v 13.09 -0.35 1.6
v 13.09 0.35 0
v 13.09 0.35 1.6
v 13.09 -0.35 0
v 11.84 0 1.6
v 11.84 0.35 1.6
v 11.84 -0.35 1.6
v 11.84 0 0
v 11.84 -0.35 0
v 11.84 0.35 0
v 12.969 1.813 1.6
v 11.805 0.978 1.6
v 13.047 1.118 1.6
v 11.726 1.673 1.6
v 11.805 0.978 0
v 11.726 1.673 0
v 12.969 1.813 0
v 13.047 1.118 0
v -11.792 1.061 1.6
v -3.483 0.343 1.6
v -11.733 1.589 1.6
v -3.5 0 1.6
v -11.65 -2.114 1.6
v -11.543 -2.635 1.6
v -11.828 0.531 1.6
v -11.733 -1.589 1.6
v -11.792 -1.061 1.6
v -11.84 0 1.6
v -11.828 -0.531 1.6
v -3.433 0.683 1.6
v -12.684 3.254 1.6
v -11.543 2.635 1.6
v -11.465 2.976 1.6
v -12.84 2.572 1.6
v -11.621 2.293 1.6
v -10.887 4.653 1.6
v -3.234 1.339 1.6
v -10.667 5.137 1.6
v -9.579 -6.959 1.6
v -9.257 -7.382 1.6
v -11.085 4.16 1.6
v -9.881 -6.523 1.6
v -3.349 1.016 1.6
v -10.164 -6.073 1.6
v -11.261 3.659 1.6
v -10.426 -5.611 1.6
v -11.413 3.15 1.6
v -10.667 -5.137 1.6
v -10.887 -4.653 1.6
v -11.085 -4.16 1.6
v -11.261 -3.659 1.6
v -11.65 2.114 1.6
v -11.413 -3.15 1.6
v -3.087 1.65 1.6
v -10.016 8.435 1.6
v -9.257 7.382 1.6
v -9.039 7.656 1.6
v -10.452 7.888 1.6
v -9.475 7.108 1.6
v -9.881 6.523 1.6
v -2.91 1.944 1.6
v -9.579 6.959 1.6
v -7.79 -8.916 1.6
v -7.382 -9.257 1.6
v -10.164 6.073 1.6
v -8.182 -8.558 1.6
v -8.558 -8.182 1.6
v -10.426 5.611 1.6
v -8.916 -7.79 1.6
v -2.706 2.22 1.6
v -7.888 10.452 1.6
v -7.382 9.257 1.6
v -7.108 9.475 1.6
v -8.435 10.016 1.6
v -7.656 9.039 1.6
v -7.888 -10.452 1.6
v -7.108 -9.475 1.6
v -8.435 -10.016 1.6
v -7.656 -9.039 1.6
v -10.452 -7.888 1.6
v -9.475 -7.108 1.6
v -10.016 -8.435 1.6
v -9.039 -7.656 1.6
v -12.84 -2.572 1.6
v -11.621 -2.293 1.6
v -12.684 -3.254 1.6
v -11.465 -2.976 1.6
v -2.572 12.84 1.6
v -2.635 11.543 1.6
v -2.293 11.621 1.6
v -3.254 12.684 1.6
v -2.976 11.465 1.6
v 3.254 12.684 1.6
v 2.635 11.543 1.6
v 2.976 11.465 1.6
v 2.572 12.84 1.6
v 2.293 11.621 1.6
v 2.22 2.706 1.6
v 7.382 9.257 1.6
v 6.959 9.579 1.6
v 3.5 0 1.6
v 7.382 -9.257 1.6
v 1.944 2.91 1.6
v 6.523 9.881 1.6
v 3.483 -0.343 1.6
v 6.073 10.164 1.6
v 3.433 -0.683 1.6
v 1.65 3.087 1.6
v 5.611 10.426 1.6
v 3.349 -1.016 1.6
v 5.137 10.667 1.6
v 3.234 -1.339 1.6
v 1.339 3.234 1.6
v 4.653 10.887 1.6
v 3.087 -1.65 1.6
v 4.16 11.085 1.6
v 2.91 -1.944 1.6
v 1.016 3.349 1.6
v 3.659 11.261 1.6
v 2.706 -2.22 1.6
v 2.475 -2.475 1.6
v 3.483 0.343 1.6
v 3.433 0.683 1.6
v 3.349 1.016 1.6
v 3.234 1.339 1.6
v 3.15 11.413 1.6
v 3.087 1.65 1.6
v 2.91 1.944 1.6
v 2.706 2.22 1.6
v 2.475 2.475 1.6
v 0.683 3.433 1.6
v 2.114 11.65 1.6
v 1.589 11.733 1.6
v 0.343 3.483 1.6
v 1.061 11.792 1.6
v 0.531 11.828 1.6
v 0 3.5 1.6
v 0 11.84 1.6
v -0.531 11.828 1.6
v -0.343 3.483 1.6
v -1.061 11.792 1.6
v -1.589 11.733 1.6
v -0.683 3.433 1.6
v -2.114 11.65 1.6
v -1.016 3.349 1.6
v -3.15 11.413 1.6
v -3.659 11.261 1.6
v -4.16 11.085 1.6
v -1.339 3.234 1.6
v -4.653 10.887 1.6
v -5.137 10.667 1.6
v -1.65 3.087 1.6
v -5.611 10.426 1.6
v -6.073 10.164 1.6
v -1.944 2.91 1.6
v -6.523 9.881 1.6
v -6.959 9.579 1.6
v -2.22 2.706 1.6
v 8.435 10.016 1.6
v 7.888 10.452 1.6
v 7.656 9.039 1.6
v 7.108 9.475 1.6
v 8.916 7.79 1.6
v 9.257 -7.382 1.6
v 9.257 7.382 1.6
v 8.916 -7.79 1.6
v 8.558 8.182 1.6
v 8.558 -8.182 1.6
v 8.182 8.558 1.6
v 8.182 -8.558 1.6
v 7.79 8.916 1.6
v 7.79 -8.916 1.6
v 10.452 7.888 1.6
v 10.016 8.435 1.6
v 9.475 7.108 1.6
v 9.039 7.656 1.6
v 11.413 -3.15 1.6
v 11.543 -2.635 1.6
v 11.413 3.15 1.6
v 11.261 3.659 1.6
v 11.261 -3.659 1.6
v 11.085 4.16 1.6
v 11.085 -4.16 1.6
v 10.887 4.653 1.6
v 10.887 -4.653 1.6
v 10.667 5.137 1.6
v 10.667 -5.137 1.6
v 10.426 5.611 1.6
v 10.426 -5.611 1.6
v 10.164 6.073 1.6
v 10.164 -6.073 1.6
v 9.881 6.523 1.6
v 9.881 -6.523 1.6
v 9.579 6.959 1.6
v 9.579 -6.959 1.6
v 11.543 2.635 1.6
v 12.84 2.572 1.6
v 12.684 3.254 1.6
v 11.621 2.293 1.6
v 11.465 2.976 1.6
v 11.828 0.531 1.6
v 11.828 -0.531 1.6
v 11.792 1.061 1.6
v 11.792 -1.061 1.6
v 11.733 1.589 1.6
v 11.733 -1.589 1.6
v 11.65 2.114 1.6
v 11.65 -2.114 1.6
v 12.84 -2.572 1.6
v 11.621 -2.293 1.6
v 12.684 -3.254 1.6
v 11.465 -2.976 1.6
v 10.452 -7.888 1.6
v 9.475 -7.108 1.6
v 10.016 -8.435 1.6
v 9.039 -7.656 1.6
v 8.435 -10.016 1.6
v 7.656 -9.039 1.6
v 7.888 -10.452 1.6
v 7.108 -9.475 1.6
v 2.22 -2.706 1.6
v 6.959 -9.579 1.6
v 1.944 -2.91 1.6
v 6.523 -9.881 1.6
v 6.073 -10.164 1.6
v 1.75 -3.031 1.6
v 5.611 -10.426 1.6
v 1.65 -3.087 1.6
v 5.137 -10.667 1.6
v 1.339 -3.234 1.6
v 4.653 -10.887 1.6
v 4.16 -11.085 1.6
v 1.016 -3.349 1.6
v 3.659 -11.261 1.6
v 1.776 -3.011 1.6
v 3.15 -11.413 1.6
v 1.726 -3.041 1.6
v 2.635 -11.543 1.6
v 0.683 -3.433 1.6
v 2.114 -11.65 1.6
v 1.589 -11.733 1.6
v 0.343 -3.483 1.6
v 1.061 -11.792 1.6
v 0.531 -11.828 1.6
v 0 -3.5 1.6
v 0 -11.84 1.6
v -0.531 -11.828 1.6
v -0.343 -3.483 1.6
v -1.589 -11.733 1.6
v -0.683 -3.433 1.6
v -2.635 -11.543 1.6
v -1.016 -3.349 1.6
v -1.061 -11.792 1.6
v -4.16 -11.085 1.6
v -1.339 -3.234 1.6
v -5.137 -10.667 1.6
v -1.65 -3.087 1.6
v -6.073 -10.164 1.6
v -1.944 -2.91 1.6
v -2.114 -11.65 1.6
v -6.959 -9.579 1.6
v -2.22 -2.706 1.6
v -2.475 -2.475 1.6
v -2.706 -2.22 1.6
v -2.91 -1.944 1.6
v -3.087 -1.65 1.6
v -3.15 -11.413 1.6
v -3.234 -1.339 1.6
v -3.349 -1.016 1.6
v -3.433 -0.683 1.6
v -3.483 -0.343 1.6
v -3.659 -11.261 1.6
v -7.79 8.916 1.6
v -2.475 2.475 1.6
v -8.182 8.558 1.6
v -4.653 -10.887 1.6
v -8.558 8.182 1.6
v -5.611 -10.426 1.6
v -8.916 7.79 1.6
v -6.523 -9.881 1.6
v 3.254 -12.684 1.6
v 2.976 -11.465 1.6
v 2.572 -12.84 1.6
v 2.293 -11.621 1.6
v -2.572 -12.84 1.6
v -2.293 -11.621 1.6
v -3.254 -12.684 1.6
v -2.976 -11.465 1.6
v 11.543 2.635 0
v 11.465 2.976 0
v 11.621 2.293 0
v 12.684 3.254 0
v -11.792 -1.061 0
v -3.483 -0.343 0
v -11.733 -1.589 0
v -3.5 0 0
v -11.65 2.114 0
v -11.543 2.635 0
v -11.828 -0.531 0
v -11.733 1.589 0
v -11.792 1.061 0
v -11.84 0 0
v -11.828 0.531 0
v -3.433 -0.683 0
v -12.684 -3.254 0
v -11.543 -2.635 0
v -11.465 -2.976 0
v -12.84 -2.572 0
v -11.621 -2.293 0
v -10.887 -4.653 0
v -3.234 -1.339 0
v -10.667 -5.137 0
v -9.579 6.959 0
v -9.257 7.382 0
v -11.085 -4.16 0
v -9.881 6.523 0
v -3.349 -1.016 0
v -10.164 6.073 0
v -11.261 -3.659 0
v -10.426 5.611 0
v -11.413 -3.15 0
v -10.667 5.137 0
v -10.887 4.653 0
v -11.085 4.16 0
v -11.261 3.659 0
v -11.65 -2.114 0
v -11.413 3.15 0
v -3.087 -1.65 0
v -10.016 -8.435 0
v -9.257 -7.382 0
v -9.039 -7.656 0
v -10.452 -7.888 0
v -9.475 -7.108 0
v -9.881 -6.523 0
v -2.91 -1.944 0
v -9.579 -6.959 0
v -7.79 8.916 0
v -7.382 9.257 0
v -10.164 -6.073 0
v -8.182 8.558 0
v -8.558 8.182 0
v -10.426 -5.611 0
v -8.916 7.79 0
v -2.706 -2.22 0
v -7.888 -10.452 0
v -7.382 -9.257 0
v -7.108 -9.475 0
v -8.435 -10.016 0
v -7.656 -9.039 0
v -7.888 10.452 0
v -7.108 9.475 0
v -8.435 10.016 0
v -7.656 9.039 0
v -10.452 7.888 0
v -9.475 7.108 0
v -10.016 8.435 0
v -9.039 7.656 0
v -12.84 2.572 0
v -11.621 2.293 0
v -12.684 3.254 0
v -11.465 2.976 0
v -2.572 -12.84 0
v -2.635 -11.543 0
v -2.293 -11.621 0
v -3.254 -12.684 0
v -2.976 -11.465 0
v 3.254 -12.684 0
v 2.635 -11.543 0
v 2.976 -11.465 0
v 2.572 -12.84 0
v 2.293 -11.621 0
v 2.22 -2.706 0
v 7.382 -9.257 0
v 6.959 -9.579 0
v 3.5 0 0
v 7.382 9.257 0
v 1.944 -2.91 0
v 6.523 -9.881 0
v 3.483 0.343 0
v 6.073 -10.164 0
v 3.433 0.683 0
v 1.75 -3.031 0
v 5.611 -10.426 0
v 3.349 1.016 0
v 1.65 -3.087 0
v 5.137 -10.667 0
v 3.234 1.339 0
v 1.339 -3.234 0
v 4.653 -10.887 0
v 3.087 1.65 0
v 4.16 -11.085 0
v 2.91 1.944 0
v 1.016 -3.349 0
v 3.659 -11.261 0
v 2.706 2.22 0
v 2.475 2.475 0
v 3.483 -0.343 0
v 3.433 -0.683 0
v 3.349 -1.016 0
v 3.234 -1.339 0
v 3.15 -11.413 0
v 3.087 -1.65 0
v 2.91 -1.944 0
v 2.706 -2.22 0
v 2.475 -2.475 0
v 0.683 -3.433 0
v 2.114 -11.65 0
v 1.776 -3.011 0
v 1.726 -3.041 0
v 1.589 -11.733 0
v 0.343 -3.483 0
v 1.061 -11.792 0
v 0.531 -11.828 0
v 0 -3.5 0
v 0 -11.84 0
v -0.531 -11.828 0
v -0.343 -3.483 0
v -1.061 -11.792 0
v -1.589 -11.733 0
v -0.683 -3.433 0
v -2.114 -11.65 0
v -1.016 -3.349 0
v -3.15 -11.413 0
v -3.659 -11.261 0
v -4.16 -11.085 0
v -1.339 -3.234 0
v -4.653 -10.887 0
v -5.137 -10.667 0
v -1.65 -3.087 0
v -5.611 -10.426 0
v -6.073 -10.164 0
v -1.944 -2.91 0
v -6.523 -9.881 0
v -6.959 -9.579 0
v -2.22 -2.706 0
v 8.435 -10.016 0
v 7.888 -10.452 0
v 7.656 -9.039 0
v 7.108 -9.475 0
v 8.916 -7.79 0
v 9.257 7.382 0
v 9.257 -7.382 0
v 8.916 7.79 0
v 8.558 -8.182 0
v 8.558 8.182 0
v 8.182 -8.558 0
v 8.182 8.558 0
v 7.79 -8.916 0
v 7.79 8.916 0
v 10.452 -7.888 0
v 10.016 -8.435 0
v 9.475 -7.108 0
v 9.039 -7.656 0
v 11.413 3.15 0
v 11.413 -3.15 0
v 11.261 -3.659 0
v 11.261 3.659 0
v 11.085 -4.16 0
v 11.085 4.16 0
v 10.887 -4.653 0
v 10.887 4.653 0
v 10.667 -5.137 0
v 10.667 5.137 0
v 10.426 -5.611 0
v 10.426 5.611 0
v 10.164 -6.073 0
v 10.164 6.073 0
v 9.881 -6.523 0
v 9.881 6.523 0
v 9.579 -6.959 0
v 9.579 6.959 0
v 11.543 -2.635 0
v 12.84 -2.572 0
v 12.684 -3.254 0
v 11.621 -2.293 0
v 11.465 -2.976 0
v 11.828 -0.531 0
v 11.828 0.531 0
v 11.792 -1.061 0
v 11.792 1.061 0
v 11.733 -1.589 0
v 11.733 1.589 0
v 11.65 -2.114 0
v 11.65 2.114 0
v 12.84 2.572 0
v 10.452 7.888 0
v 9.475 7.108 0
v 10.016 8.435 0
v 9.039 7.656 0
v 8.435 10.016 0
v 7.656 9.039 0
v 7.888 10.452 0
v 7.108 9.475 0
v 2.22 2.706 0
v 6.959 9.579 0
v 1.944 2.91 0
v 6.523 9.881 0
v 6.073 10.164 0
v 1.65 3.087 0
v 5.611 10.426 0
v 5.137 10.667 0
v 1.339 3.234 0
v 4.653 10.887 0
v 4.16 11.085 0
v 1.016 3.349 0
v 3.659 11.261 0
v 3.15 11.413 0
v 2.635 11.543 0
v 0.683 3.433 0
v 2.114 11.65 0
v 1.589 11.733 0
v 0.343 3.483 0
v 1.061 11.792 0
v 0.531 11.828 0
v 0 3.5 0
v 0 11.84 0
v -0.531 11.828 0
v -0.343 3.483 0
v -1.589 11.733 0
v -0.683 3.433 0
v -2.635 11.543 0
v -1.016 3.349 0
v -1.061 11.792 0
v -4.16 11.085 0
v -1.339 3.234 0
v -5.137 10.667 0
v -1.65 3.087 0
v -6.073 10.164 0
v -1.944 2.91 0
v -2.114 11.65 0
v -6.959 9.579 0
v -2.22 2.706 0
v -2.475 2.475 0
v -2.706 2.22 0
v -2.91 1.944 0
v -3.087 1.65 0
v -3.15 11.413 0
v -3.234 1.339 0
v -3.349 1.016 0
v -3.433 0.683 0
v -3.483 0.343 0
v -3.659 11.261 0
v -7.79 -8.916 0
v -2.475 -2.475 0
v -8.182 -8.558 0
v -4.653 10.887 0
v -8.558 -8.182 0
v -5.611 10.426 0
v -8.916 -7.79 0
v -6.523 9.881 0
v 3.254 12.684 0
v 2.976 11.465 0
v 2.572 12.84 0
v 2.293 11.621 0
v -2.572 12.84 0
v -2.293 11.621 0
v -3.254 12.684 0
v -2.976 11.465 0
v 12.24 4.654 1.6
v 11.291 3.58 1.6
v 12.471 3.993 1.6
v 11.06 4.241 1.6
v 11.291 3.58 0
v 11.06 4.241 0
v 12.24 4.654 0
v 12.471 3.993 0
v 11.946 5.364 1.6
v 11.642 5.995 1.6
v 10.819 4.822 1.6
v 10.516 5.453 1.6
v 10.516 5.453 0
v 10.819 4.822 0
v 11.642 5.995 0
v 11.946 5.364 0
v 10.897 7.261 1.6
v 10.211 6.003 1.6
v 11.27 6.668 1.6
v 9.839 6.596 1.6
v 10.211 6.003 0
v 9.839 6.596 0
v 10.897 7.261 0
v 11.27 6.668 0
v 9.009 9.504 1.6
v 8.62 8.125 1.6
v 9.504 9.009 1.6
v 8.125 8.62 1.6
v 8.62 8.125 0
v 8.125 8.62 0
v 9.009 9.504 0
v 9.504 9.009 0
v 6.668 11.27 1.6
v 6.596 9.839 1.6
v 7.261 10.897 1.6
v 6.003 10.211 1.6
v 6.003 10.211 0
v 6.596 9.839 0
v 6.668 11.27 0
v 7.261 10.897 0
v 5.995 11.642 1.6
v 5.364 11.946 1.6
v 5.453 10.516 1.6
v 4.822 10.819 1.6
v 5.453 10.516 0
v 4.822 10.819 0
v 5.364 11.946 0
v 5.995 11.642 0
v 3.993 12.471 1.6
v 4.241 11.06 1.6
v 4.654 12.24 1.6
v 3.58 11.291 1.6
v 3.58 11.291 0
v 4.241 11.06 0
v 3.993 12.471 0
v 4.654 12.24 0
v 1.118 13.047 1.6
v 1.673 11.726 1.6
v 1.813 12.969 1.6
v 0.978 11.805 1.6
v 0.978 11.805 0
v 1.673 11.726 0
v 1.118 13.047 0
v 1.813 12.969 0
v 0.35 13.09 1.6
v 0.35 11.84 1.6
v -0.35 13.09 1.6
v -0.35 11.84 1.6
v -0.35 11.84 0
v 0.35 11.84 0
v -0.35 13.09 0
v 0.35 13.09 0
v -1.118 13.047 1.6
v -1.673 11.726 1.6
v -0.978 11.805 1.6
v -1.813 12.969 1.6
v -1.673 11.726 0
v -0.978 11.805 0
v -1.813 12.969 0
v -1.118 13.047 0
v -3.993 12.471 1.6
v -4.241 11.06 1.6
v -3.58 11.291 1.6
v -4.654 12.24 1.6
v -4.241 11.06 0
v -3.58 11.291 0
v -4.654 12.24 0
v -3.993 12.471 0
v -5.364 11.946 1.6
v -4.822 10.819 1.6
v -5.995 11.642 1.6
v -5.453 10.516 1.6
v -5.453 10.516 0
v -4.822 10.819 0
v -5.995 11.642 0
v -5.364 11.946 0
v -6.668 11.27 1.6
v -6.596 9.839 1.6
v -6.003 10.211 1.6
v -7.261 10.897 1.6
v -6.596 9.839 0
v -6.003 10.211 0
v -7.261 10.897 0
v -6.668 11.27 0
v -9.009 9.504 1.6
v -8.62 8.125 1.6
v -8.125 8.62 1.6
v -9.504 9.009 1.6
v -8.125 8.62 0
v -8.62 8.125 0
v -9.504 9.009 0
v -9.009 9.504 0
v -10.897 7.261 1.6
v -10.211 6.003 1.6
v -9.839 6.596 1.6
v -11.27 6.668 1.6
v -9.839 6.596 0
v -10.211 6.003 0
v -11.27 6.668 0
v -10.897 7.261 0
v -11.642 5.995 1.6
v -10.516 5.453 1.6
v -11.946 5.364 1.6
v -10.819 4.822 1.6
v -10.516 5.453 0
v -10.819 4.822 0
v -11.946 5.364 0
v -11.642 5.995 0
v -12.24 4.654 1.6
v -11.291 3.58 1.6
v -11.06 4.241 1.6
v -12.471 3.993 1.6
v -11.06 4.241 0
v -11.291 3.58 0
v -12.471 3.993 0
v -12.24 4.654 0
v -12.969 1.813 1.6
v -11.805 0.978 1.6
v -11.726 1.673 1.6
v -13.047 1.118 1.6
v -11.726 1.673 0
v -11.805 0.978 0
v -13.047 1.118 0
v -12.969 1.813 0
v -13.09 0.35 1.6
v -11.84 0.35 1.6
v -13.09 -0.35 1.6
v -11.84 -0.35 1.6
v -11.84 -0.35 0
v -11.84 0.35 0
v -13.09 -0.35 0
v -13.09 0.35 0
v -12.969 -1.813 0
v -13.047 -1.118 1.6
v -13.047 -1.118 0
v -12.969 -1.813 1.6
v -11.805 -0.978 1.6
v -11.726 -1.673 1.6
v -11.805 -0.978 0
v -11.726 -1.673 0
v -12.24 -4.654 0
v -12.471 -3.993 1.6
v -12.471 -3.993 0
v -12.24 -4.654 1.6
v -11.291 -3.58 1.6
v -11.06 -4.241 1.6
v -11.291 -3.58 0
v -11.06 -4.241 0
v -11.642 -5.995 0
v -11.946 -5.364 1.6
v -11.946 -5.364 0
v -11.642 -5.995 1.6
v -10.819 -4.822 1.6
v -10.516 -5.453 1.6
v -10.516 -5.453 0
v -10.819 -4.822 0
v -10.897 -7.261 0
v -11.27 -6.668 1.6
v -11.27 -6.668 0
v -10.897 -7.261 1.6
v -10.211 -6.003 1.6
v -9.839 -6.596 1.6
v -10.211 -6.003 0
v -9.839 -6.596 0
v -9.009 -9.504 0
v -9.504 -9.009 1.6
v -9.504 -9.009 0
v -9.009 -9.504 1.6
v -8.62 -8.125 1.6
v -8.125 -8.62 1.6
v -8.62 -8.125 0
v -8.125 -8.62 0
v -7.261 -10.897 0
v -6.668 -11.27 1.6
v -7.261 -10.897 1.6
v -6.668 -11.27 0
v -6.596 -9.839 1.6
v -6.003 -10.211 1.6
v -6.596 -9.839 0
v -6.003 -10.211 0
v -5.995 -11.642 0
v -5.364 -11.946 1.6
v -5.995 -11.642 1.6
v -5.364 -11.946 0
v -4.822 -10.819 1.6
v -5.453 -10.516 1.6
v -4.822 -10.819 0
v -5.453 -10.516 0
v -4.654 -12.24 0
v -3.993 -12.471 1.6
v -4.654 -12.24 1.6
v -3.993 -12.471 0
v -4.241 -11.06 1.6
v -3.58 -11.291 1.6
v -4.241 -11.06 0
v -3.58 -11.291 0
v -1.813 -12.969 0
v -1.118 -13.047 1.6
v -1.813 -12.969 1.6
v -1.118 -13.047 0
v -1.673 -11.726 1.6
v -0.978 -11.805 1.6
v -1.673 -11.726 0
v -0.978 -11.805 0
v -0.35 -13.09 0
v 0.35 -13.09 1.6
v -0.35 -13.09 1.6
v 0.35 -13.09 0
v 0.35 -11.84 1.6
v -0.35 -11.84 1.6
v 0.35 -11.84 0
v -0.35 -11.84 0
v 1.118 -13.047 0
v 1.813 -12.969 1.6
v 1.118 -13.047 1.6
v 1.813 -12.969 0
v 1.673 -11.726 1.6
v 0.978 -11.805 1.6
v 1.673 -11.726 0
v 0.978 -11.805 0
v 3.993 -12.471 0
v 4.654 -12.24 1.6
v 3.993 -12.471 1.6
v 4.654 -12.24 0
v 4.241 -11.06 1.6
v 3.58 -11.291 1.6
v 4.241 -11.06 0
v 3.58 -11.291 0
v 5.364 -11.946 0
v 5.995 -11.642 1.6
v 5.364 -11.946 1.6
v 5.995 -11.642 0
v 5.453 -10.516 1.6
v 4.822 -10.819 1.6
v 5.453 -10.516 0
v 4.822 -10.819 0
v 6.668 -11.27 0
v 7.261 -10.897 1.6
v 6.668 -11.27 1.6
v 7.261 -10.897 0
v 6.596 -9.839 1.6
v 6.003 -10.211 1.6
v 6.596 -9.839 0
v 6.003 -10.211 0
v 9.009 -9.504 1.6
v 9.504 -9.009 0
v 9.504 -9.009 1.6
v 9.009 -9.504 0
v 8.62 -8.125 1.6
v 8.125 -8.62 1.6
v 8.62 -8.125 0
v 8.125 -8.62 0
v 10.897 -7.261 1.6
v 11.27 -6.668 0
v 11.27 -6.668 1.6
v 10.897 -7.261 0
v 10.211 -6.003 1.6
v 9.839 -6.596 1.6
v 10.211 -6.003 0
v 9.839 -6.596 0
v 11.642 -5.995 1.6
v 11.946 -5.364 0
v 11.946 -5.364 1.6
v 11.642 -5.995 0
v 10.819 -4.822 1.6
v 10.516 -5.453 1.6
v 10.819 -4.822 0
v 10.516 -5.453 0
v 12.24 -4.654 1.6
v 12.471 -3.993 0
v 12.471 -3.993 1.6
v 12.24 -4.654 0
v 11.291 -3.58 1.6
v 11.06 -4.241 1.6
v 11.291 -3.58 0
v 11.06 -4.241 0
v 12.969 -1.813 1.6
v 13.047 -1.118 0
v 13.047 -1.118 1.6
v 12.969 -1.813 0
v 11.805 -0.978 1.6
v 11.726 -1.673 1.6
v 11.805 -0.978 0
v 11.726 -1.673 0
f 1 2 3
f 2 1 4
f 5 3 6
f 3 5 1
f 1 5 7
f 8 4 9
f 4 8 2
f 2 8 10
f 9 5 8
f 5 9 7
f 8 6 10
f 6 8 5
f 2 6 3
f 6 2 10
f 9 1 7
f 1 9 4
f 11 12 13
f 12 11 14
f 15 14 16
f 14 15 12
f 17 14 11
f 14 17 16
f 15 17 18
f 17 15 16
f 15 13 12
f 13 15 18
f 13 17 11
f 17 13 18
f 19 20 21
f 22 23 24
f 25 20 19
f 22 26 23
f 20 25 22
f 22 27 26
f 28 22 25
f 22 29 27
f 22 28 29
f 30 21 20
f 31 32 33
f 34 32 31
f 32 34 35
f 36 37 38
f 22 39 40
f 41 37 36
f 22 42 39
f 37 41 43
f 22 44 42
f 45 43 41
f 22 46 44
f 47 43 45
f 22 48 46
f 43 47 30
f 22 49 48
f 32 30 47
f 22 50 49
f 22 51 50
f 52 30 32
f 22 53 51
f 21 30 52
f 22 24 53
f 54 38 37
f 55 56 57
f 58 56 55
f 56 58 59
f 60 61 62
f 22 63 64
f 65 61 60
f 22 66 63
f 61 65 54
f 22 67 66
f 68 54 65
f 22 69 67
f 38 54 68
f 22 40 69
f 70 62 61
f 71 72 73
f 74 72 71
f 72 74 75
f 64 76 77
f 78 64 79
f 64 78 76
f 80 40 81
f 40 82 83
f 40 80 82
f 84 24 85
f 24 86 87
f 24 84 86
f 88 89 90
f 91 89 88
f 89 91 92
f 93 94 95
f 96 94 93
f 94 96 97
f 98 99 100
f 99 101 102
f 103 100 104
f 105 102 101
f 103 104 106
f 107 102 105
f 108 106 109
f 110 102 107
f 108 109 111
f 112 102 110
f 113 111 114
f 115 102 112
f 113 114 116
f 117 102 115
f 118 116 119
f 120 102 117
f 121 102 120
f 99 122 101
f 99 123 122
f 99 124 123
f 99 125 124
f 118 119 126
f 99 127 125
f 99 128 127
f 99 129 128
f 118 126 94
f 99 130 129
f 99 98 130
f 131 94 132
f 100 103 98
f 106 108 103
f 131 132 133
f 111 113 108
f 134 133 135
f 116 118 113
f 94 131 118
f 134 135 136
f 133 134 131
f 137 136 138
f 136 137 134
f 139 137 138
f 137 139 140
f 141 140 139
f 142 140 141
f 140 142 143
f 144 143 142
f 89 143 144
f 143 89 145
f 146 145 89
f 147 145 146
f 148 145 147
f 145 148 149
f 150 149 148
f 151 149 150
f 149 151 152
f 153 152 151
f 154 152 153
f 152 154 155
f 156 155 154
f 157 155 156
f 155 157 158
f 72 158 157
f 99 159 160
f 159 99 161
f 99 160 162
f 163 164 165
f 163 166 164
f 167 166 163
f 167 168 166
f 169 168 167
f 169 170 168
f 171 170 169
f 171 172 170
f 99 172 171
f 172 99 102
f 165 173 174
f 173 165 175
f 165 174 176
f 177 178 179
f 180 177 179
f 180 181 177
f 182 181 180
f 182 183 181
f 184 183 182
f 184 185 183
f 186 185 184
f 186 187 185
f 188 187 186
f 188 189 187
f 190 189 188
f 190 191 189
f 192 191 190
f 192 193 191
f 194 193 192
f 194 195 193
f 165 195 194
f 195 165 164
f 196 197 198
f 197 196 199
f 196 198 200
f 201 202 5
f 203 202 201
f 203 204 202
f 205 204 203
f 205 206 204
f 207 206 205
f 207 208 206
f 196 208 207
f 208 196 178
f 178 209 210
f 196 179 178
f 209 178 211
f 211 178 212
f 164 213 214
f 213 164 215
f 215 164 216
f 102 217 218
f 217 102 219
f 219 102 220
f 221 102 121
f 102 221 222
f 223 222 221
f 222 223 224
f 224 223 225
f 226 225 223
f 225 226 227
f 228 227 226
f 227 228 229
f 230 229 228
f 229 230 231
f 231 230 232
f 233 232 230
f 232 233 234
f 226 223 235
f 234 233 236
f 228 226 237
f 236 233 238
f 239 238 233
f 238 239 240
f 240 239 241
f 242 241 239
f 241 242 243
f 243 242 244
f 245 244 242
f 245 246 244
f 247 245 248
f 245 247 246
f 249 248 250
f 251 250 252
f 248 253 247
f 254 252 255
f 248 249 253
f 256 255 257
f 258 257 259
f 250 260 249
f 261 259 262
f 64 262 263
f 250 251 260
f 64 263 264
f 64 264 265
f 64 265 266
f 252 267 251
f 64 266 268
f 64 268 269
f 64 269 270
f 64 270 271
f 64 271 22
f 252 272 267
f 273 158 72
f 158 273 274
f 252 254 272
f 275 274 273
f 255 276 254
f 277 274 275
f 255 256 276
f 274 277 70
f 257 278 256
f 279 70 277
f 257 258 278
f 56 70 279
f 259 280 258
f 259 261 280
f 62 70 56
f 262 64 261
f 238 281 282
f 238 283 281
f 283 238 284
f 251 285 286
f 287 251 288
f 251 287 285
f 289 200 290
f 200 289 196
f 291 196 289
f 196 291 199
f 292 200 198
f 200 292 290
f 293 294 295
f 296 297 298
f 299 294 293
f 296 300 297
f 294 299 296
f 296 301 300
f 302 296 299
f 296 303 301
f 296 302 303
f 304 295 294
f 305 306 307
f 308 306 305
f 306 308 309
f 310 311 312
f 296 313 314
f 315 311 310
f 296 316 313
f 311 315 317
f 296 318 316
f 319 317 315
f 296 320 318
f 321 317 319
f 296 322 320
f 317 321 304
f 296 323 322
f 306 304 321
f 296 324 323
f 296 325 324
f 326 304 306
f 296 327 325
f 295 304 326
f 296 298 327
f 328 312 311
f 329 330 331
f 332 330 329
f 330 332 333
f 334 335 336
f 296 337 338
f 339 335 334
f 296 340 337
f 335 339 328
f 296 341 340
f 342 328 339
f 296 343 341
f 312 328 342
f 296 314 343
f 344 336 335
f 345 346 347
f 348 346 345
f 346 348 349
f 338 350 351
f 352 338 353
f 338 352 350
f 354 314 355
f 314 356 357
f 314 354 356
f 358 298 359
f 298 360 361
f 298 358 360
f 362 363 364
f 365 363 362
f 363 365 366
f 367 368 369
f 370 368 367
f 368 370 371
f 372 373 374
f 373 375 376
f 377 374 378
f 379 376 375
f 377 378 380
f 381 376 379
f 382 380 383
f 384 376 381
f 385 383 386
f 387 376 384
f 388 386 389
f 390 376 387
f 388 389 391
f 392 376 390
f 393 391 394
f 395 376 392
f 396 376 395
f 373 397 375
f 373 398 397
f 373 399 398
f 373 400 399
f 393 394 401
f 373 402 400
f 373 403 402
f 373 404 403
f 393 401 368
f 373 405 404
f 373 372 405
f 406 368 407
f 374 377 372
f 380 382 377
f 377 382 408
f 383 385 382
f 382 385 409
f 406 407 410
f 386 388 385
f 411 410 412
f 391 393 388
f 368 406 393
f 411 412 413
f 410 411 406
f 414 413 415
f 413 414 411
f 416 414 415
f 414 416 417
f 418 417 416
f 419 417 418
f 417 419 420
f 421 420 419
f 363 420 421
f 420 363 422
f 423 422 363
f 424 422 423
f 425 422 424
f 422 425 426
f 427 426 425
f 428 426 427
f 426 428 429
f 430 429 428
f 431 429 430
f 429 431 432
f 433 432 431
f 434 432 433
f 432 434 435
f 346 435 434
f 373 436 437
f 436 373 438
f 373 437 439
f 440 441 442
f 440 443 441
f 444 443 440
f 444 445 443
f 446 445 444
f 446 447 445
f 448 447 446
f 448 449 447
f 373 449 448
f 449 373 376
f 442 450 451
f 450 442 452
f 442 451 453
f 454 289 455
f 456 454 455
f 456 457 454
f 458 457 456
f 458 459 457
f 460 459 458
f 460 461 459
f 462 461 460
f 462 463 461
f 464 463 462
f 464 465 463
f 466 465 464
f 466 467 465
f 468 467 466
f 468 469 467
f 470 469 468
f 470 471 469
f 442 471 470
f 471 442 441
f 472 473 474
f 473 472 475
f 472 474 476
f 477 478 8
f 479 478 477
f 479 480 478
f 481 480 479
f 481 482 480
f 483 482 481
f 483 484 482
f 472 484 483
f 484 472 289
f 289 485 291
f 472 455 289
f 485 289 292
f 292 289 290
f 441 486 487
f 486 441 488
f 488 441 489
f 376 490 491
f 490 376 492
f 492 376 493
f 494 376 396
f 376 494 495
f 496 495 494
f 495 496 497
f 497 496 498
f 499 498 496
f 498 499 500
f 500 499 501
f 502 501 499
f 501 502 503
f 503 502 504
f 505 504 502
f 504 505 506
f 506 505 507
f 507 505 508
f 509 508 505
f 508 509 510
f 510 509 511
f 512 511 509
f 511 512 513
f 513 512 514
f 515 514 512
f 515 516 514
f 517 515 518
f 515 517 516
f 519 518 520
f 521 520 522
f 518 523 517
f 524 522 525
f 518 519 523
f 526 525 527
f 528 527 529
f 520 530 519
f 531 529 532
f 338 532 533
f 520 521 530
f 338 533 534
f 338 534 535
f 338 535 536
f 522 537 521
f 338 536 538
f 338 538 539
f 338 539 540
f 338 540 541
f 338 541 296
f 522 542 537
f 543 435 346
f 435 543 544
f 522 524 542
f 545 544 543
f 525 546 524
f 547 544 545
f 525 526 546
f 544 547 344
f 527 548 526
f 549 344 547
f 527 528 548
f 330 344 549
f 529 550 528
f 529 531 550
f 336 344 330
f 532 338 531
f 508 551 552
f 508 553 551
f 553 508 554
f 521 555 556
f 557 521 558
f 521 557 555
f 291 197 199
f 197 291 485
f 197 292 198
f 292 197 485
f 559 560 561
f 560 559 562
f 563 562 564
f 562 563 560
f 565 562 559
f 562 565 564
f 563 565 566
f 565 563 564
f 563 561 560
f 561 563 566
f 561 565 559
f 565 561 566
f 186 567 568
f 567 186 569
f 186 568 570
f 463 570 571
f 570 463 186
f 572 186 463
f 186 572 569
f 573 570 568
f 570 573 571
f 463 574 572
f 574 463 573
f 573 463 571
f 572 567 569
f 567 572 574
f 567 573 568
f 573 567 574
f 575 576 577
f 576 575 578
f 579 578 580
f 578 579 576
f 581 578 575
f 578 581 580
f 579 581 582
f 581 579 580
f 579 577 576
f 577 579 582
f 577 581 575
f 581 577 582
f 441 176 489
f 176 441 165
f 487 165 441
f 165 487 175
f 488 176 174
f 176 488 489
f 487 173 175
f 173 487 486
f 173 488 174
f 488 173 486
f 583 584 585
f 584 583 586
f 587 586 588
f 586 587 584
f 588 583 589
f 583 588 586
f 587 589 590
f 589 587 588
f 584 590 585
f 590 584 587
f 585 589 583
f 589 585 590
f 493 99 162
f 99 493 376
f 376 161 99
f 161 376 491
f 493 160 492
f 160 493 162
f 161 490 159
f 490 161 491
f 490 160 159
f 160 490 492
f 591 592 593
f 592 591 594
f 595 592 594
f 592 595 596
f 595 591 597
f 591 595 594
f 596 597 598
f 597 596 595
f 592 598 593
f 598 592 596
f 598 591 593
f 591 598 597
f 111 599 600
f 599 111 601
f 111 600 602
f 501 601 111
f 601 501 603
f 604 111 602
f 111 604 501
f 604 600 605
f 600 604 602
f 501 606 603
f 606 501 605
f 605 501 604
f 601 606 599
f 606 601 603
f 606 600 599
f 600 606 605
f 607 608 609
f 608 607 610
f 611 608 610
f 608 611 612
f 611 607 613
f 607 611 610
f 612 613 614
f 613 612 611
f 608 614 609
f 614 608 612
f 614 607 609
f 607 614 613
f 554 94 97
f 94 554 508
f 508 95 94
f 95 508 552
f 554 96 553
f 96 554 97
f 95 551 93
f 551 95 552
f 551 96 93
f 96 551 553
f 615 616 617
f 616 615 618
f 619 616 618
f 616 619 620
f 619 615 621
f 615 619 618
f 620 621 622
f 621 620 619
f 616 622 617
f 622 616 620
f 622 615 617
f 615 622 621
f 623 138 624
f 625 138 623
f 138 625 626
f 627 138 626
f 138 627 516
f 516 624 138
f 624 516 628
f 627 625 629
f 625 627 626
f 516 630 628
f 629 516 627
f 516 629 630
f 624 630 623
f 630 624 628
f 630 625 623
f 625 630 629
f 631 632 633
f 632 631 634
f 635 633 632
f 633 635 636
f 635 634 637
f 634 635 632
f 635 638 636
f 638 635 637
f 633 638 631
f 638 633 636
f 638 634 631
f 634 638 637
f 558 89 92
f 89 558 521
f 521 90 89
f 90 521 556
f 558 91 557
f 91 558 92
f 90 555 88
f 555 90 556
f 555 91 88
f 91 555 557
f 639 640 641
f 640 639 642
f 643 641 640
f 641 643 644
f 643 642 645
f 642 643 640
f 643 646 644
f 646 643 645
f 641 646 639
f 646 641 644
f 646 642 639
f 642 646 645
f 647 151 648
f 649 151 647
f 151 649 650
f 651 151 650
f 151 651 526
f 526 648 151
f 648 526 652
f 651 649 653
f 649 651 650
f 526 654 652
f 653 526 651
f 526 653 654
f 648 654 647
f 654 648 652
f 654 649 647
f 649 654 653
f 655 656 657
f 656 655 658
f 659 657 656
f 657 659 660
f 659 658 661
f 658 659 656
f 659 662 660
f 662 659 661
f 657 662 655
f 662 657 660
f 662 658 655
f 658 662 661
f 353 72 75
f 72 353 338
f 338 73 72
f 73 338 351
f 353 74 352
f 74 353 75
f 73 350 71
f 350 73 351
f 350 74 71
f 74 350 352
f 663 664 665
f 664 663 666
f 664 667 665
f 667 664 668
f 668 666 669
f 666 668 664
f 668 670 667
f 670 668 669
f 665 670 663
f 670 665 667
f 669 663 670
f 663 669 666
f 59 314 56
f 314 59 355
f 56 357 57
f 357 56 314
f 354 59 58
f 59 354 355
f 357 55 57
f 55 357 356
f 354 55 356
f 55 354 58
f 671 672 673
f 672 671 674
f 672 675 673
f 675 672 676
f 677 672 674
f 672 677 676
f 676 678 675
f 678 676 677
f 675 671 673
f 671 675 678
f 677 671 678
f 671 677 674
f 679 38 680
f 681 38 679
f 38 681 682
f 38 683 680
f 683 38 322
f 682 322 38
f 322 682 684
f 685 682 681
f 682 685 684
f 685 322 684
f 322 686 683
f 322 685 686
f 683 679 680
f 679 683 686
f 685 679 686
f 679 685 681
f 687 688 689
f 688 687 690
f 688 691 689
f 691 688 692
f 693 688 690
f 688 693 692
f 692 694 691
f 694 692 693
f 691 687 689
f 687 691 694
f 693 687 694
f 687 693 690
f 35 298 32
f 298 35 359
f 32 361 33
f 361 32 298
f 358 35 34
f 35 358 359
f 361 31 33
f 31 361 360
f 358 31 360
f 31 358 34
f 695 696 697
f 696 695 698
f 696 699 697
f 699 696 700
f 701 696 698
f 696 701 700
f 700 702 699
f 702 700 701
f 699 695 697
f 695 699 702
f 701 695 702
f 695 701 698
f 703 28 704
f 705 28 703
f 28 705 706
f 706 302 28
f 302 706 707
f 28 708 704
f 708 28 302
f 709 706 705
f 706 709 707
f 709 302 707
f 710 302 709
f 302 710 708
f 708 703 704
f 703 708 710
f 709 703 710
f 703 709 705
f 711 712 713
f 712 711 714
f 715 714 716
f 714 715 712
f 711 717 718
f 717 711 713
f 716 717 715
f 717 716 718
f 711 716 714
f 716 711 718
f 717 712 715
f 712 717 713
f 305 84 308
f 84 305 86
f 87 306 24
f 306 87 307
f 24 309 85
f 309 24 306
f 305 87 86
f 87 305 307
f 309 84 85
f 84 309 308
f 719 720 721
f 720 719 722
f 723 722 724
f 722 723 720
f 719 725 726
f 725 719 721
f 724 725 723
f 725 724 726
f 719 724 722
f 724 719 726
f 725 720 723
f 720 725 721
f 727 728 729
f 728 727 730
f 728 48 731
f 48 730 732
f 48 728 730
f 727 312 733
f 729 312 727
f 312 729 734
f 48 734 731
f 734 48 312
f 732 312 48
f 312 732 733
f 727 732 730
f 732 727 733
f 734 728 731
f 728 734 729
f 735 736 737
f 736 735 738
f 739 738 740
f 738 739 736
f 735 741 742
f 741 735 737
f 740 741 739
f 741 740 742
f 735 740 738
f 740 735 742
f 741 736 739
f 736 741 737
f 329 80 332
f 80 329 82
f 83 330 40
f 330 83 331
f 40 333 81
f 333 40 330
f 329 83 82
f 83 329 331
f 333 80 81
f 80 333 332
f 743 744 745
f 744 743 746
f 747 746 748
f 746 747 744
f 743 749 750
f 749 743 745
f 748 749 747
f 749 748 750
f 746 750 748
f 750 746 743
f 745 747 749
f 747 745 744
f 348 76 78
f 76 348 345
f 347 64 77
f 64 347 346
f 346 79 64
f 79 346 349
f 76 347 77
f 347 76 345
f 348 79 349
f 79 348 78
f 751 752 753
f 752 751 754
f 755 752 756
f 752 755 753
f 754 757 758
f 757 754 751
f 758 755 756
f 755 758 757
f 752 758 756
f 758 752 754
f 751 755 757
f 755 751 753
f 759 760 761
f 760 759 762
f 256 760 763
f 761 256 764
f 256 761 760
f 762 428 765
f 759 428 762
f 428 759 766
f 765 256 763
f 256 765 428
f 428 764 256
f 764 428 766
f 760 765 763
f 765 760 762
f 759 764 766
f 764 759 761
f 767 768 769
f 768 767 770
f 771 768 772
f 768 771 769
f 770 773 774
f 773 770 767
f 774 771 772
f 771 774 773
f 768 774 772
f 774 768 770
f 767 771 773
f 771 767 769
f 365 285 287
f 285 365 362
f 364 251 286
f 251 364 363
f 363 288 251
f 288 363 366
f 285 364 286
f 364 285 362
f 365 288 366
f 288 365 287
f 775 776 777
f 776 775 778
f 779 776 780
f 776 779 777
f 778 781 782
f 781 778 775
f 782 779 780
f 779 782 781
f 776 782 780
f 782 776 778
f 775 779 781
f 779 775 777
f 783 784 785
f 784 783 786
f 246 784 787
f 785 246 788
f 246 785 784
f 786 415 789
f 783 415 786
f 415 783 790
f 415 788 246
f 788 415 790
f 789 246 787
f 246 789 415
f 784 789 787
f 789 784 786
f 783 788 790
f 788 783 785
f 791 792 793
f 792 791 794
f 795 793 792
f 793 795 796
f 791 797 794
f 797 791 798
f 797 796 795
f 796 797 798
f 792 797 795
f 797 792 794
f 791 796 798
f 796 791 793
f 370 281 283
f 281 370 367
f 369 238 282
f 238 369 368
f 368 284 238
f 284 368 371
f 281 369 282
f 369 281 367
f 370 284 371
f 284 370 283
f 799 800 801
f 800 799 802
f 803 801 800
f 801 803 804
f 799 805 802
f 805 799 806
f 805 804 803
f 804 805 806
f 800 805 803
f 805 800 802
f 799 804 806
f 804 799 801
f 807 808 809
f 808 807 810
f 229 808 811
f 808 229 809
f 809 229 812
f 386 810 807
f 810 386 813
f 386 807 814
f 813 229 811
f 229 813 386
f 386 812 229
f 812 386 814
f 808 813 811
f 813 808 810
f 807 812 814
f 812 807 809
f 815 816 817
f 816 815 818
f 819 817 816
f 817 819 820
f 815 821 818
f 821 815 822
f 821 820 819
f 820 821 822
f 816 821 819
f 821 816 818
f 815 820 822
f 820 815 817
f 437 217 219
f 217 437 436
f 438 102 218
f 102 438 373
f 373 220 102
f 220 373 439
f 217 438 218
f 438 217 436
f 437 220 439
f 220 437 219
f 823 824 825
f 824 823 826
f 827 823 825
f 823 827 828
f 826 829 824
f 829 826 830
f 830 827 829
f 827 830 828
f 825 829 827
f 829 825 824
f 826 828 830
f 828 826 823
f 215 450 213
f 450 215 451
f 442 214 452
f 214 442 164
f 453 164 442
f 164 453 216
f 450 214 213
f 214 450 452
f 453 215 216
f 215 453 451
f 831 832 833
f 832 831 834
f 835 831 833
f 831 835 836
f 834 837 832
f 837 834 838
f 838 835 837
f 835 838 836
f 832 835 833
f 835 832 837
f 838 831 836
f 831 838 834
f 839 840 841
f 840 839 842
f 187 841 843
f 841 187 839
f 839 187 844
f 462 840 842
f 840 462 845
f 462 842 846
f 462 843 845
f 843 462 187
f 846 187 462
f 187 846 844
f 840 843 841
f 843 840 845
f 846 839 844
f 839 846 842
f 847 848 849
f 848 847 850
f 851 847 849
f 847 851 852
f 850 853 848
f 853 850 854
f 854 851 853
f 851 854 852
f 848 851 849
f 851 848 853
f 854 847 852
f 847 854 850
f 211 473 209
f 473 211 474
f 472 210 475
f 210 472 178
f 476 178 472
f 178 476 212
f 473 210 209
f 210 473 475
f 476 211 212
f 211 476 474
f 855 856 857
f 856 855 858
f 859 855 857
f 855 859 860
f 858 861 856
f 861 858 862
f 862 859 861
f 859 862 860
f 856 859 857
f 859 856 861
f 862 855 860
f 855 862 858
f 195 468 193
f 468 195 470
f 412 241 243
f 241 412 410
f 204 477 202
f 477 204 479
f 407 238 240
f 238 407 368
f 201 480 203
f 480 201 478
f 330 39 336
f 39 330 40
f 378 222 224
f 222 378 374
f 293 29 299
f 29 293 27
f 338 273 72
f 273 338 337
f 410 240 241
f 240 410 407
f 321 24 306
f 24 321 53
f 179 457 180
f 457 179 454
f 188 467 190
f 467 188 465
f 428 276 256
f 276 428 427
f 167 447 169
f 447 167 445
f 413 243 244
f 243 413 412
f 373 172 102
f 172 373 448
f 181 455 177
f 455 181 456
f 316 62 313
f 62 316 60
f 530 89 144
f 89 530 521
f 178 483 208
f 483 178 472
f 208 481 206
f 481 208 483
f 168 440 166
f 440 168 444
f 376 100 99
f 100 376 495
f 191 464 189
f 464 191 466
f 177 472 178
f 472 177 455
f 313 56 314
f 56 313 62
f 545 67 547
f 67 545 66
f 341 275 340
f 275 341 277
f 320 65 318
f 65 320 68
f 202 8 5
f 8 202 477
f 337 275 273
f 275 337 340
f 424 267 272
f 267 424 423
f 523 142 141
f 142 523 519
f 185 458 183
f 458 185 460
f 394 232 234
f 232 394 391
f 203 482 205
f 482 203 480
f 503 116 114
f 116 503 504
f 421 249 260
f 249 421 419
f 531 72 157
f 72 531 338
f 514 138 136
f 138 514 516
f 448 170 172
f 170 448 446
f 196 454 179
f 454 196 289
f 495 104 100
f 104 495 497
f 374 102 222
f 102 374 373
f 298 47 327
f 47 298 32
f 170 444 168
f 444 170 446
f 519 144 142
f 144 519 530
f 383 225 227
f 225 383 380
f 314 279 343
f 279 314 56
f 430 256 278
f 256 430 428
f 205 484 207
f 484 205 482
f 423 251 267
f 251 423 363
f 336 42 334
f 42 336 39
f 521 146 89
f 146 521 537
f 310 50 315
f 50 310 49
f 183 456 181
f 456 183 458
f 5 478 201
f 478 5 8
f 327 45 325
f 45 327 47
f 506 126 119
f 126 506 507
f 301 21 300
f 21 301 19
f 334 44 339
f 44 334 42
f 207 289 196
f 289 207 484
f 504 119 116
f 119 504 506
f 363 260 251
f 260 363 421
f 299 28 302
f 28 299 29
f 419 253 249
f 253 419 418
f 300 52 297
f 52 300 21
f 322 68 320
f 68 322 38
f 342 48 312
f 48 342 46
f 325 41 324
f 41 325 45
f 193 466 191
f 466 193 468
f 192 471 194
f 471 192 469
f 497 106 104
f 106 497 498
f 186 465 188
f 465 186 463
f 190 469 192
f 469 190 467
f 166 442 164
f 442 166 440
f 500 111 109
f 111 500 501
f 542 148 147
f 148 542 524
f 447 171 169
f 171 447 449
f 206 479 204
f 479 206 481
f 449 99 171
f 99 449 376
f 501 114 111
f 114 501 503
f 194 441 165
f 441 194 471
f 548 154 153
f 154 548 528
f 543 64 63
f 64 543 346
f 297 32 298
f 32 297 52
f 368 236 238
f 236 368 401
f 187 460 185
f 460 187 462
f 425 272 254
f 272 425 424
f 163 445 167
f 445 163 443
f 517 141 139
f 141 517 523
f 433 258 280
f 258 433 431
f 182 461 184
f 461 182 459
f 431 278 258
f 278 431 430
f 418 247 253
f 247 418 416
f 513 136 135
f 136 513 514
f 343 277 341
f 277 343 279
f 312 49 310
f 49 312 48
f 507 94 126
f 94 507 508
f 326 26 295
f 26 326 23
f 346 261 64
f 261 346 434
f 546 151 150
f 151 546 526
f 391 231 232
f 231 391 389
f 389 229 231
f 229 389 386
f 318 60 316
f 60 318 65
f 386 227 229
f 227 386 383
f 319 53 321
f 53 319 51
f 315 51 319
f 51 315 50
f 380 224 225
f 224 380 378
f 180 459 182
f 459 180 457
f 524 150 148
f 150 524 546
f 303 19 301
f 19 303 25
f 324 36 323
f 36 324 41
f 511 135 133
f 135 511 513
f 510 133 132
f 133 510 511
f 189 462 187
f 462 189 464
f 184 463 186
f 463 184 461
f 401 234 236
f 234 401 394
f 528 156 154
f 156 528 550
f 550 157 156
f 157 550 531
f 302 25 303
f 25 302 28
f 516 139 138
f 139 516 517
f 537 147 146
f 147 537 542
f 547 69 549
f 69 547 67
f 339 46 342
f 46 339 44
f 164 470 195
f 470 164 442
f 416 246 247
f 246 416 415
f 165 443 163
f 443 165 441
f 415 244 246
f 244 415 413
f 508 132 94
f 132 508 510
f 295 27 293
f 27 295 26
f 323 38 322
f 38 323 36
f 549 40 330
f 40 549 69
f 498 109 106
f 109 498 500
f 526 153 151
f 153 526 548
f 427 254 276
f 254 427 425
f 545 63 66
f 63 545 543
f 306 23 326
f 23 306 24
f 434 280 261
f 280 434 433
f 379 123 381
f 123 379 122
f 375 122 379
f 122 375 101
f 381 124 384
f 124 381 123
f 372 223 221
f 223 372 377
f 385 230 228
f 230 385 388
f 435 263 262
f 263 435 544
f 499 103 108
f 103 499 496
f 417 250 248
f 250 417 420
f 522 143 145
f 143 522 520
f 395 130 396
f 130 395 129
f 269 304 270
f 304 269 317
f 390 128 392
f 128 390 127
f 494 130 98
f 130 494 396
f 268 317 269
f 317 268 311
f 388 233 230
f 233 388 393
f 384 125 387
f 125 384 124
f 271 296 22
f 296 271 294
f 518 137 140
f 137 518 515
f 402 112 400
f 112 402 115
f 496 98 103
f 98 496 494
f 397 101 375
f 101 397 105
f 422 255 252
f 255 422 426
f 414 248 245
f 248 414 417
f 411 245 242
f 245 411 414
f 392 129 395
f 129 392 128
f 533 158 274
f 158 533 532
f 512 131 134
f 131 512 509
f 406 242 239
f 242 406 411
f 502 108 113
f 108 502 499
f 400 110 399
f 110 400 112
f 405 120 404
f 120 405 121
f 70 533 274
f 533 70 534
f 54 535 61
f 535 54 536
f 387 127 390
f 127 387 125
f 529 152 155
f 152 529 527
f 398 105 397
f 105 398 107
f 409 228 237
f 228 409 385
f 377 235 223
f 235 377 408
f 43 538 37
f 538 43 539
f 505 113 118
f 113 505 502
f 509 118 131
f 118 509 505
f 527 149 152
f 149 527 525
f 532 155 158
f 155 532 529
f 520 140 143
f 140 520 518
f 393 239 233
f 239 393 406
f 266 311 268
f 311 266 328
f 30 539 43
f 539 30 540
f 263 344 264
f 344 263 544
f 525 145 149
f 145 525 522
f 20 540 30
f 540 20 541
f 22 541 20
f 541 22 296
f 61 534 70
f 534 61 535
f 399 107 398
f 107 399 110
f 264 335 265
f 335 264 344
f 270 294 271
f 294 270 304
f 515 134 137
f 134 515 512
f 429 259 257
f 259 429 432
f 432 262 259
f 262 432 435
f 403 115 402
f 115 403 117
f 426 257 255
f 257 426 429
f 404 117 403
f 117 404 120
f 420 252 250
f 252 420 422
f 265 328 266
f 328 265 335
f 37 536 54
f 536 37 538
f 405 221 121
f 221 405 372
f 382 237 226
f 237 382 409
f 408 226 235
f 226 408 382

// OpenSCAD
// part_id: jup1
// name: Jupiter main gear
// source_drawing_ids: DRW-012
// units: mm
// revision: 0.1
// SPDX-License-Identifier: MIT

module jup1_tooth_ring(root_d = 23.68, tip_d = 26.18, tooth_count = 56, thickness = 1.6, tooth_w = 0.70) {
    union() {
        cylinder(d = root_d, h = thickness, center = false, $fn = 140);
        for (a = [0 : 360 / tooth_count : 360 - 360 / tooth_count]) {
            rotate([0, 0, a])
                translate([root_d / 2, -tooth_w / 2, 0])
                    cube([(tip_d - root_d) / 2, tooth_w, thickness], center = false);
        }
    }
}

module part_jup1(
    root_d = 23.68,
    tip_d = 26.18,
    tooth_count = 56,
    thickness = 1.6,
    bore_d = 7.0,
    pin_d = 1.0,
    pin_r = 3.0,
    pin_a = -60
) {
    difference() {
        jup1_tooth_ring(root_d = root_d, tip_d = tip_d, tooth_count = tooth_count, thickness = thickness);
        translate([0, 0, -0.05]) cylinder(d = bore_d, h = thickness + 0.1, $fn = 64);
        translate([pin_r * cos(pin_a), pin_r * sin(pin_a), -0.05])
            cylinder(d = pin_d, h = thickness + 0.1, $fn = 24);
    }
}

// ---- "main guard" ----
// Default to previewing when opened directly:
if (is_undef(__LIB_MODE__)) {
    part_jup1();
}
